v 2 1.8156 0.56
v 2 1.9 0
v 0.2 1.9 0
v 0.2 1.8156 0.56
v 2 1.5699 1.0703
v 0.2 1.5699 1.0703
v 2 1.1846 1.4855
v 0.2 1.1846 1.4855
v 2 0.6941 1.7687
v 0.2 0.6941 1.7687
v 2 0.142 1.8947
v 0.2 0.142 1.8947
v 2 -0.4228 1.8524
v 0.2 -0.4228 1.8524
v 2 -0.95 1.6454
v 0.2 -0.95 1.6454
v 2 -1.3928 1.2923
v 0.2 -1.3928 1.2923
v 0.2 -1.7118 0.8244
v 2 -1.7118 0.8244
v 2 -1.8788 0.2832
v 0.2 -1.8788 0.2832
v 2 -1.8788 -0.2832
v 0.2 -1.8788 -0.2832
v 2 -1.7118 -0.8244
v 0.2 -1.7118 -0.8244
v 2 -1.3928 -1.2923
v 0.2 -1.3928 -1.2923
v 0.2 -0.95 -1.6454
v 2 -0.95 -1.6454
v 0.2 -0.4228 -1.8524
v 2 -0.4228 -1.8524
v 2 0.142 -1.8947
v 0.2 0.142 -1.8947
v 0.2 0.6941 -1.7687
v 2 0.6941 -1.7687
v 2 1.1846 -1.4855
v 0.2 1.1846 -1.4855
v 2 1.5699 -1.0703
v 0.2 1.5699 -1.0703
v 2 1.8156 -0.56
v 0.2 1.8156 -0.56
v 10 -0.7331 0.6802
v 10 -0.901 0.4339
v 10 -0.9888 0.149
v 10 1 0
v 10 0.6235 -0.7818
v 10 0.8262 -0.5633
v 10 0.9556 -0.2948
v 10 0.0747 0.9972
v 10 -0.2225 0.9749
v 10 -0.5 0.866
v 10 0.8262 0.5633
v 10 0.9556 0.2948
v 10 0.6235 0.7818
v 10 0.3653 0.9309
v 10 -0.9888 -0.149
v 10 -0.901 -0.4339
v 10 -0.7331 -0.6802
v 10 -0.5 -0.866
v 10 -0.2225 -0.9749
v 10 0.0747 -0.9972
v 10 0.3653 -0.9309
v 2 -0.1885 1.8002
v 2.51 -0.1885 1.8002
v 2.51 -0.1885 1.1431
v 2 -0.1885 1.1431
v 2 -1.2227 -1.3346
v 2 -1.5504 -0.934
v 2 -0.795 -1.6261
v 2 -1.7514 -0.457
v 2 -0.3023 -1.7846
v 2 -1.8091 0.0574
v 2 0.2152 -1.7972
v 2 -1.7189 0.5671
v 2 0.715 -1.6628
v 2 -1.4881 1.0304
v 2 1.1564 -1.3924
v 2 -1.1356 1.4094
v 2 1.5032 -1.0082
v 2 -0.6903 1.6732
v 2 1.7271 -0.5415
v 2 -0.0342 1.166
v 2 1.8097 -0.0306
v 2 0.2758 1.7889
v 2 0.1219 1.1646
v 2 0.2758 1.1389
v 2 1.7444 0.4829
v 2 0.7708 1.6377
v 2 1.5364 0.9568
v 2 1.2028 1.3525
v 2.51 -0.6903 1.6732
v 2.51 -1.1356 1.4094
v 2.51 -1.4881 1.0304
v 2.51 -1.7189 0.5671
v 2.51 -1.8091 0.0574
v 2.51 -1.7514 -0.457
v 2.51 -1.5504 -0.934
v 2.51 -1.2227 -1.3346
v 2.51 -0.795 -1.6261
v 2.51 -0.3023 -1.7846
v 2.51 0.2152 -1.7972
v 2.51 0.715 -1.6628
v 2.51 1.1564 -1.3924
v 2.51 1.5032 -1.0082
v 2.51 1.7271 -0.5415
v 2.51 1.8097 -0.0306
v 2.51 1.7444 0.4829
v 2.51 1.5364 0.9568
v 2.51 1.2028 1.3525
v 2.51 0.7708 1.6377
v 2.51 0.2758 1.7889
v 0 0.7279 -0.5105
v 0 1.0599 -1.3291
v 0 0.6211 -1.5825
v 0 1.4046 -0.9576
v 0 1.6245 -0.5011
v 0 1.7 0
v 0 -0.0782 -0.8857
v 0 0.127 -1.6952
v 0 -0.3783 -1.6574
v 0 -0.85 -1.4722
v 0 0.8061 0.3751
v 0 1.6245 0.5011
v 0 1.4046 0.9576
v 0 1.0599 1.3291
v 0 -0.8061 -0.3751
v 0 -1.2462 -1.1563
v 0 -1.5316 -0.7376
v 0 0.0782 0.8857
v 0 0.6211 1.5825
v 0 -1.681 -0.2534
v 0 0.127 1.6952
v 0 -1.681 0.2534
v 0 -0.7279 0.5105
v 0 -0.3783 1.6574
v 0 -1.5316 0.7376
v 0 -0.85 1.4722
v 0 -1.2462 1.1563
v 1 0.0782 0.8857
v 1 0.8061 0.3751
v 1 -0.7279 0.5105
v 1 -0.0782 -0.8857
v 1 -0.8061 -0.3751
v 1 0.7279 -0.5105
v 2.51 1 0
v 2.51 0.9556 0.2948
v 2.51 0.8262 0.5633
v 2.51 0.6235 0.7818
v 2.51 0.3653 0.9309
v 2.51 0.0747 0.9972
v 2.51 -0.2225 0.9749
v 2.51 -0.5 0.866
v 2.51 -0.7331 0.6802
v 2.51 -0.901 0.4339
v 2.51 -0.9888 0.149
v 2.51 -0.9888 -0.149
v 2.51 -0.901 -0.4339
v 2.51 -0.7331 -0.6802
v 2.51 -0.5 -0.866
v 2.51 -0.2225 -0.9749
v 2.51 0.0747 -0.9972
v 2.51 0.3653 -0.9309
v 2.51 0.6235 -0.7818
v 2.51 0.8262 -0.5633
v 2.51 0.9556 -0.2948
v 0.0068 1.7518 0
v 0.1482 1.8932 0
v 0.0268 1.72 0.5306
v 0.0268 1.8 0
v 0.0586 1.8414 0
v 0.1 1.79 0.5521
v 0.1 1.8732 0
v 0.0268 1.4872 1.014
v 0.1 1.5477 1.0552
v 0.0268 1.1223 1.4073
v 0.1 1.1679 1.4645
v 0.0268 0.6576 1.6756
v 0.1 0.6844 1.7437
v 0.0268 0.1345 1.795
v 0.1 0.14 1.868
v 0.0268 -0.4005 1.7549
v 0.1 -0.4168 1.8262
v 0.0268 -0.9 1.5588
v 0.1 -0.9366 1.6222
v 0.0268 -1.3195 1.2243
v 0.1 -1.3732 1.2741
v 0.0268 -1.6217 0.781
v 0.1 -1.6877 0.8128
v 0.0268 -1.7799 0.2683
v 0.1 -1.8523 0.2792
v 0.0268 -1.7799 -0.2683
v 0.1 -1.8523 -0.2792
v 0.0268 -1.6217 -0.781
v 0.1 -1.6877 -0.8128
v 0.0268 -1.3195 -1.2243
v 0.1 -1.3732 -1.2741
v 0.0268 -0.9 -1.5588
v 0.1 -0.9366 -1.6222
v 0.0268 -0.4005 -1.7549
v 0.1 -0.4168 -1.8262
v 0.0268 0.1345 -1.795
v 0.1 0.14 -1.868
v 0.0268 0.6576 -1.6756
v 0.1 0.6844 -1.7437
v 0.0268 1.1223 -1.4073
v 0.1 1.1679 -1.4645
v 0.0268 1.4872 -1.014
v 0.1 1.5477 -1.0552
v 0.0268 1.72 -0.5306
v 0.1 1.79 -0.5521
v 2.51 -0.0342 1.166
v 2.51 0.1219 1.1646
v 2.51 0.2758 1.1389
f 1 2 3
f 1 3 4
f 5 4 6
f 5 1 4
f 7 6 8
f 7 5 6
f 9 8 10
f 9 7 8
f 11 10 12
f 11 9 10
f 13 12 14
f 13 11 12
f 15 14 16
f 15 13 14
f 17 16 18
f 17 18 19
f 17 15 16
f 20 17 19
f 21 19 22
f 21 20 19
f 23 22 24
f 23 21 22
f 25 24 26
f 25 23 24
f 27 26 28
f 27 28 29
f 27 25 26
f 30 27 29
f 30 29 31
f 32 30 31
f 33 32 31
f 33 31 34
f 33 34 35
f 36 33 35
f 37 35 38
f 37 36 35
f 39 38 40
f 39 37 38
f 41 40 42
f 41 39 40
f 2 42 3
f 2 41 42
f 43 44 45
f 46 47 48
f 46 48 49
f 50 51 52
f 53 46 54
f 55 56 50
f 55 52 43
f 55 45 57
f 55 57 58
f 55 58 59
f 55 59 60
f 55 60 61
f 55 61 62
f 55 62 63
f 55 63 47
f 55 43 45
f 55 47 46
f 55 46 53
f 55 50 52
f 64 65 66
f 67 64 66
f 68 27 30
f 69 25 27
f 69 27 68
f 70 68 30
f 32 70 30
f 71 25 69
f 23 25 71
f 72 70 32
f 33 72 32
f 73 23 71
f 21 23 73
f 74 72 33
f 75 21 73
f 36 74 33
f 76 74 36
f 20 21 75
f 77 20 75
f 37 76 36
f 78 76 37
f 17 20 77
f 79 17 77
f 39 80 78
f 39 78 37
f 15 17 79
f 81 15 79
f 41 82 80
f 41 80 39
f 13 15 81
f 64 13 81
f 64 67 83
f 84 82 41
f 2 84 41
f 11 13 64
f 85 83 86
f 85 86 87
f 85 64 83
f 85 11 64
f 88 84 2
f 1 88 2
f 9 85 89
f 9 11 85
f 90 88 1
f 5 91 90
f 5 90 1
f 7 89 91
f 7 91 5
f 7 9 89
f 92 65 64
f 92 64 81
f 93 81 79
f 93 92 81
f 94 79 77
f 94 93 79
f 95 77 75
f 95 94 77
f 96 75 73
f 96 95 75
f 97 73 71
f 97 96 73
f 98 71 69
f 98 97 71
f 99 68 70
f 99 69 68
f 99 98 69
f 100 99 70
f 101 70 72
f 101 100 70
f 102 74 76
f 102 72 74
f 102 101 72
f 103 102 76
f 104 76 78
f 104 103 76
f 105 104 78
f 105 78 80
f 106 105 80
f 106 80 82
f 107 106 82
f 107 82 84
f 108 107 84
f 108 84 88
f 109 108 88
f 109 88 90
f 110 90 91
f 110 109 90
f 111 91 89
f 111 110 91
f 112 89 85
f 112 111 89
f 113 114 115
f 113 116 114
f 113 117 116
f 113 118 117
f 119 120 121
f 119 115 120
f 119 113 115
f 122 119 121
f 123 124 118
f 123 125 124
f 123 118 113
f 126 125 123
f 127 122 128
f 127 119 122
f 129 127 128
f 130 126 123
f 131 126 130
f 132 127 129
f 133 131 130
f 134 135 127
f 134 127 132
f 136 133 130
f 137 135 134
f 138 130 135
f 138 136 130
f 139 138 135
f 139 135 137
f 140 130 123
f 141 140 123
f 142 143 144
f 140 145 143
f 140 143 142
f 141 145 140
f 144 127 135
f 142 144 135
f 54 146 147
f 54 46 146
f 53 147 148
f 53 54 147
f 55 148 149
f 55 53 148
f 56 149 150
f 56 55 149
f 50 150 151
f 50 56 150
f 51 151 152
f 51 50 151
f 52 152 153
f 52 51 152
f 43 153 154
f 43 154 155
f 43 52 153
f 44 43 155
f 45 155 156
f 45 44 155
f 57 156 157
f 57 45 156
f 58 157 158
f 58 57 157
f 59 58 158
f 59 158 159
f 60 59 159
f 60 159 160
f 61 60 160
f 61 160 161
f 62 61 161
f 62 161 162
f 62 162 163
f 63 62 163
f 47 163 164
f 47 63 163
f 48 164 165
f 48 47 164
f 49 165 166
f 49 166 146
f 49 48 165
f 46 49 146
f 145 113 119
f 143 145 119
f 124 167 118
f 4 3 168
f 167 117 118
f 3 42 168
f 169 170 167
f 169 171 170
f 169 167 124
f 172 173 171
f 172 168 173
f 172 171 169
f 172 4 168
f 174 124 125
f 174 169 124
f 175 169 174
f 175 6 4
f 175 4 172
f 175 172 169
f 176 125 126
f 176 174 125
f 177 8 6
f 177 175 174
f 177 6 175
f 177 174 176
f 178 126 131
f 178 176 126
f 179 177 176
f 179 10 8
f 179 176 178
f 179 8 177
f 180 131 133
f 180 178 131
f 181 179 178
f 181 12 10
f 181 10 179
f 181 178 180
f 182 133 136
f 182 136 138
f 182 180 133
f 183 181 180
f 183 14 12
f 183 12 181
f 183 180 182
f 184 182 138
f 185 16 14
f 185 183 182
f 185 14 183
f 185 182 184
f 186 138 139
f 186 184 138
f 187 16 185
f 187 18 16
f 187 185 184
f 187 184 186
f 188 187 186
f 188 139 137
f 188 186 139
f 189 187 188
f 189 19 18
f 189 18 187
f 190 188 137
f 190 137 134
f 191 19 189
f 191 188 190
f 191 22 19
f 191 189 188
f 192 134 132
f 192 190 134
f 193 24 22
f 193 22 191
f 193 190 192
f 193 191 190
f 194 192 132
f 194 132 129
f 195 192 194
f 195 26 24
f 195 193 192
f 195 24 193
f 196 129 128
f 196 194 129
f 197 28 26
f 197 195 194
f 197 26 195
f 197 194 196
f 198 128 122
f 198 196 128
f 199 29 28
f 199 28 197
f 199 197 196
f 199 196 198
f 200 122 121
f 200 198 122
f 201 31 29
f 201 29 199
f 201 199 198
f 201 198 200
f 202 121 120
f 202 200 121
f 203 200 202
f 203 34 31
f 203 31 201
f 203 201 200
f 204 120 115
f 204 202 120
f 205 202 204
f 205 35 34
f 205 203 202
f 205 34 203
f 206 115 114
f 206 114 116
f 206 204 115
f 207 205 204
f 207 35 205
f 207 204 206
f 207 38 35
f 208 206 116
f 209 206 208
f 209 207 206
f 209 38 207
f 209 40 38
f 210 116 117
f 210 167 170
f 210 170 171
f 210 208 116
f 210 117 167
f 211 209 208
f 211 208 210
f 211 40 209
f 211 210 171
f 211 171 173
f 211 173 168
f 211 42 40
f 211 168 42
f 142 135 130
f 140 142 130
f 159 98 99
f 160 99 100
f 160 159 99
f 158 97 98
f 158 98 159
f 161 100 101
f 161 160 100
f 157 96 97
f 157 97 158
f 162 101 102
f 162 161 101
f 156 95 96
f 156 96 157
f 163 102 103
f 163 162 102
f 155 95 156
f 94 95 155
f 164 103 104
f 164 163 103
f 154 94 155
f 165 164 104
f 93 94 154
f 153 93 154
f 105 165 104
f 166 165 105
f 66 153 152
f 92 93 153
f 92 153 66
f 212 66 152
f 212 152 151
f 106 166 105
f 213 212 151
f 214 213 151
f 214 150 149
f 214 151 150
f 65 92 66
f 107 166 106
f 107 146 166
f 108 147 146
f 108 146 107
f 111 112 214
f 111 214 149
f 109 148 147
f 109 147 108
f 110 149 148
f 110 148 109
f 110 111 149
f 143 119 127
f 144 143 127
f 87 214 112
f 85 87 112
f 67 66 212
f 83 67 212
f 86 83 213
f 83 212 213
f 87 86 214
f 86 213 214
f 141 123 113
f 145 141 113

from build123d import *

# Parameters (mm, degrees)
CUT_EXTRUDE_1_DEPTH = 1
FILLET_1_R          = 0.2
CUT_EXTRUDE_2_DEPTH = 0.51


with BuildPart() as part:
    # 草图1 → 旋转1 (revolve)
    with BuildSketch(Plane.XY):
        Polygon((0, 0), (0, 1.9), (2, 1.9), (2, 1.81), (2.51, 1.81), (2.51, 1), (10, 1), (10, 0), align=None)
    revolve(axis=Axis((0, 0, 0), (1, 0, 0)))

    # 草图2 → 切除-拉伸1 (cut)
    with BuildSketch(Plane.ZY):
        Polygon((0.510545523, -0.727926234), (0.885675372, 0.078182276), (0.375129849, 0.80610851), (-0.510545523, 0.727926234), (-0.885675372, -0.078182276), (-0.375129849, -0.80610851), align=None)
    extrude(amount=-CUT_EXTRUDE_1_DEPTH, mode=Mode.SUBTRACT)

    # 圆角1
    fillet_1_edges = [part.edges().sort_by_distance(p)[0] for p in [
        (0, -1.9, 0),
    ]]
    fillet(fillet_1_edges, radius=FILLET_1_R)

    # 草图3 → 切除-拉伸2 (cut)
    with BuildSketch(Plane(origin=(2.51, 0, 0), x_dir=(0, 0, -1), z_dir=(1, 0, 0))):
        with BuildLine():
            Line((-1.138940095, 0.275804569), (-1.788863281, 0.275804569))
            ThreePointArc((-1.788863281, 0.275804569), (-1.809465078, 0.044001494), (-1.800154668, -0.188528969))
            Line((-1.800154668, -0.188528969), (-1.143106206, -0.188528969))
            ThreePointArc((-1.143106206, -0.188528969), (-1.168348286, 0.043882968), (-1.138940095, 0.275804569))
        make_face()
    extrude(amount=-CUT_EXTRUDE_2_DEPTH, mode=Mode.SUBTRACT)


solid = part.part
